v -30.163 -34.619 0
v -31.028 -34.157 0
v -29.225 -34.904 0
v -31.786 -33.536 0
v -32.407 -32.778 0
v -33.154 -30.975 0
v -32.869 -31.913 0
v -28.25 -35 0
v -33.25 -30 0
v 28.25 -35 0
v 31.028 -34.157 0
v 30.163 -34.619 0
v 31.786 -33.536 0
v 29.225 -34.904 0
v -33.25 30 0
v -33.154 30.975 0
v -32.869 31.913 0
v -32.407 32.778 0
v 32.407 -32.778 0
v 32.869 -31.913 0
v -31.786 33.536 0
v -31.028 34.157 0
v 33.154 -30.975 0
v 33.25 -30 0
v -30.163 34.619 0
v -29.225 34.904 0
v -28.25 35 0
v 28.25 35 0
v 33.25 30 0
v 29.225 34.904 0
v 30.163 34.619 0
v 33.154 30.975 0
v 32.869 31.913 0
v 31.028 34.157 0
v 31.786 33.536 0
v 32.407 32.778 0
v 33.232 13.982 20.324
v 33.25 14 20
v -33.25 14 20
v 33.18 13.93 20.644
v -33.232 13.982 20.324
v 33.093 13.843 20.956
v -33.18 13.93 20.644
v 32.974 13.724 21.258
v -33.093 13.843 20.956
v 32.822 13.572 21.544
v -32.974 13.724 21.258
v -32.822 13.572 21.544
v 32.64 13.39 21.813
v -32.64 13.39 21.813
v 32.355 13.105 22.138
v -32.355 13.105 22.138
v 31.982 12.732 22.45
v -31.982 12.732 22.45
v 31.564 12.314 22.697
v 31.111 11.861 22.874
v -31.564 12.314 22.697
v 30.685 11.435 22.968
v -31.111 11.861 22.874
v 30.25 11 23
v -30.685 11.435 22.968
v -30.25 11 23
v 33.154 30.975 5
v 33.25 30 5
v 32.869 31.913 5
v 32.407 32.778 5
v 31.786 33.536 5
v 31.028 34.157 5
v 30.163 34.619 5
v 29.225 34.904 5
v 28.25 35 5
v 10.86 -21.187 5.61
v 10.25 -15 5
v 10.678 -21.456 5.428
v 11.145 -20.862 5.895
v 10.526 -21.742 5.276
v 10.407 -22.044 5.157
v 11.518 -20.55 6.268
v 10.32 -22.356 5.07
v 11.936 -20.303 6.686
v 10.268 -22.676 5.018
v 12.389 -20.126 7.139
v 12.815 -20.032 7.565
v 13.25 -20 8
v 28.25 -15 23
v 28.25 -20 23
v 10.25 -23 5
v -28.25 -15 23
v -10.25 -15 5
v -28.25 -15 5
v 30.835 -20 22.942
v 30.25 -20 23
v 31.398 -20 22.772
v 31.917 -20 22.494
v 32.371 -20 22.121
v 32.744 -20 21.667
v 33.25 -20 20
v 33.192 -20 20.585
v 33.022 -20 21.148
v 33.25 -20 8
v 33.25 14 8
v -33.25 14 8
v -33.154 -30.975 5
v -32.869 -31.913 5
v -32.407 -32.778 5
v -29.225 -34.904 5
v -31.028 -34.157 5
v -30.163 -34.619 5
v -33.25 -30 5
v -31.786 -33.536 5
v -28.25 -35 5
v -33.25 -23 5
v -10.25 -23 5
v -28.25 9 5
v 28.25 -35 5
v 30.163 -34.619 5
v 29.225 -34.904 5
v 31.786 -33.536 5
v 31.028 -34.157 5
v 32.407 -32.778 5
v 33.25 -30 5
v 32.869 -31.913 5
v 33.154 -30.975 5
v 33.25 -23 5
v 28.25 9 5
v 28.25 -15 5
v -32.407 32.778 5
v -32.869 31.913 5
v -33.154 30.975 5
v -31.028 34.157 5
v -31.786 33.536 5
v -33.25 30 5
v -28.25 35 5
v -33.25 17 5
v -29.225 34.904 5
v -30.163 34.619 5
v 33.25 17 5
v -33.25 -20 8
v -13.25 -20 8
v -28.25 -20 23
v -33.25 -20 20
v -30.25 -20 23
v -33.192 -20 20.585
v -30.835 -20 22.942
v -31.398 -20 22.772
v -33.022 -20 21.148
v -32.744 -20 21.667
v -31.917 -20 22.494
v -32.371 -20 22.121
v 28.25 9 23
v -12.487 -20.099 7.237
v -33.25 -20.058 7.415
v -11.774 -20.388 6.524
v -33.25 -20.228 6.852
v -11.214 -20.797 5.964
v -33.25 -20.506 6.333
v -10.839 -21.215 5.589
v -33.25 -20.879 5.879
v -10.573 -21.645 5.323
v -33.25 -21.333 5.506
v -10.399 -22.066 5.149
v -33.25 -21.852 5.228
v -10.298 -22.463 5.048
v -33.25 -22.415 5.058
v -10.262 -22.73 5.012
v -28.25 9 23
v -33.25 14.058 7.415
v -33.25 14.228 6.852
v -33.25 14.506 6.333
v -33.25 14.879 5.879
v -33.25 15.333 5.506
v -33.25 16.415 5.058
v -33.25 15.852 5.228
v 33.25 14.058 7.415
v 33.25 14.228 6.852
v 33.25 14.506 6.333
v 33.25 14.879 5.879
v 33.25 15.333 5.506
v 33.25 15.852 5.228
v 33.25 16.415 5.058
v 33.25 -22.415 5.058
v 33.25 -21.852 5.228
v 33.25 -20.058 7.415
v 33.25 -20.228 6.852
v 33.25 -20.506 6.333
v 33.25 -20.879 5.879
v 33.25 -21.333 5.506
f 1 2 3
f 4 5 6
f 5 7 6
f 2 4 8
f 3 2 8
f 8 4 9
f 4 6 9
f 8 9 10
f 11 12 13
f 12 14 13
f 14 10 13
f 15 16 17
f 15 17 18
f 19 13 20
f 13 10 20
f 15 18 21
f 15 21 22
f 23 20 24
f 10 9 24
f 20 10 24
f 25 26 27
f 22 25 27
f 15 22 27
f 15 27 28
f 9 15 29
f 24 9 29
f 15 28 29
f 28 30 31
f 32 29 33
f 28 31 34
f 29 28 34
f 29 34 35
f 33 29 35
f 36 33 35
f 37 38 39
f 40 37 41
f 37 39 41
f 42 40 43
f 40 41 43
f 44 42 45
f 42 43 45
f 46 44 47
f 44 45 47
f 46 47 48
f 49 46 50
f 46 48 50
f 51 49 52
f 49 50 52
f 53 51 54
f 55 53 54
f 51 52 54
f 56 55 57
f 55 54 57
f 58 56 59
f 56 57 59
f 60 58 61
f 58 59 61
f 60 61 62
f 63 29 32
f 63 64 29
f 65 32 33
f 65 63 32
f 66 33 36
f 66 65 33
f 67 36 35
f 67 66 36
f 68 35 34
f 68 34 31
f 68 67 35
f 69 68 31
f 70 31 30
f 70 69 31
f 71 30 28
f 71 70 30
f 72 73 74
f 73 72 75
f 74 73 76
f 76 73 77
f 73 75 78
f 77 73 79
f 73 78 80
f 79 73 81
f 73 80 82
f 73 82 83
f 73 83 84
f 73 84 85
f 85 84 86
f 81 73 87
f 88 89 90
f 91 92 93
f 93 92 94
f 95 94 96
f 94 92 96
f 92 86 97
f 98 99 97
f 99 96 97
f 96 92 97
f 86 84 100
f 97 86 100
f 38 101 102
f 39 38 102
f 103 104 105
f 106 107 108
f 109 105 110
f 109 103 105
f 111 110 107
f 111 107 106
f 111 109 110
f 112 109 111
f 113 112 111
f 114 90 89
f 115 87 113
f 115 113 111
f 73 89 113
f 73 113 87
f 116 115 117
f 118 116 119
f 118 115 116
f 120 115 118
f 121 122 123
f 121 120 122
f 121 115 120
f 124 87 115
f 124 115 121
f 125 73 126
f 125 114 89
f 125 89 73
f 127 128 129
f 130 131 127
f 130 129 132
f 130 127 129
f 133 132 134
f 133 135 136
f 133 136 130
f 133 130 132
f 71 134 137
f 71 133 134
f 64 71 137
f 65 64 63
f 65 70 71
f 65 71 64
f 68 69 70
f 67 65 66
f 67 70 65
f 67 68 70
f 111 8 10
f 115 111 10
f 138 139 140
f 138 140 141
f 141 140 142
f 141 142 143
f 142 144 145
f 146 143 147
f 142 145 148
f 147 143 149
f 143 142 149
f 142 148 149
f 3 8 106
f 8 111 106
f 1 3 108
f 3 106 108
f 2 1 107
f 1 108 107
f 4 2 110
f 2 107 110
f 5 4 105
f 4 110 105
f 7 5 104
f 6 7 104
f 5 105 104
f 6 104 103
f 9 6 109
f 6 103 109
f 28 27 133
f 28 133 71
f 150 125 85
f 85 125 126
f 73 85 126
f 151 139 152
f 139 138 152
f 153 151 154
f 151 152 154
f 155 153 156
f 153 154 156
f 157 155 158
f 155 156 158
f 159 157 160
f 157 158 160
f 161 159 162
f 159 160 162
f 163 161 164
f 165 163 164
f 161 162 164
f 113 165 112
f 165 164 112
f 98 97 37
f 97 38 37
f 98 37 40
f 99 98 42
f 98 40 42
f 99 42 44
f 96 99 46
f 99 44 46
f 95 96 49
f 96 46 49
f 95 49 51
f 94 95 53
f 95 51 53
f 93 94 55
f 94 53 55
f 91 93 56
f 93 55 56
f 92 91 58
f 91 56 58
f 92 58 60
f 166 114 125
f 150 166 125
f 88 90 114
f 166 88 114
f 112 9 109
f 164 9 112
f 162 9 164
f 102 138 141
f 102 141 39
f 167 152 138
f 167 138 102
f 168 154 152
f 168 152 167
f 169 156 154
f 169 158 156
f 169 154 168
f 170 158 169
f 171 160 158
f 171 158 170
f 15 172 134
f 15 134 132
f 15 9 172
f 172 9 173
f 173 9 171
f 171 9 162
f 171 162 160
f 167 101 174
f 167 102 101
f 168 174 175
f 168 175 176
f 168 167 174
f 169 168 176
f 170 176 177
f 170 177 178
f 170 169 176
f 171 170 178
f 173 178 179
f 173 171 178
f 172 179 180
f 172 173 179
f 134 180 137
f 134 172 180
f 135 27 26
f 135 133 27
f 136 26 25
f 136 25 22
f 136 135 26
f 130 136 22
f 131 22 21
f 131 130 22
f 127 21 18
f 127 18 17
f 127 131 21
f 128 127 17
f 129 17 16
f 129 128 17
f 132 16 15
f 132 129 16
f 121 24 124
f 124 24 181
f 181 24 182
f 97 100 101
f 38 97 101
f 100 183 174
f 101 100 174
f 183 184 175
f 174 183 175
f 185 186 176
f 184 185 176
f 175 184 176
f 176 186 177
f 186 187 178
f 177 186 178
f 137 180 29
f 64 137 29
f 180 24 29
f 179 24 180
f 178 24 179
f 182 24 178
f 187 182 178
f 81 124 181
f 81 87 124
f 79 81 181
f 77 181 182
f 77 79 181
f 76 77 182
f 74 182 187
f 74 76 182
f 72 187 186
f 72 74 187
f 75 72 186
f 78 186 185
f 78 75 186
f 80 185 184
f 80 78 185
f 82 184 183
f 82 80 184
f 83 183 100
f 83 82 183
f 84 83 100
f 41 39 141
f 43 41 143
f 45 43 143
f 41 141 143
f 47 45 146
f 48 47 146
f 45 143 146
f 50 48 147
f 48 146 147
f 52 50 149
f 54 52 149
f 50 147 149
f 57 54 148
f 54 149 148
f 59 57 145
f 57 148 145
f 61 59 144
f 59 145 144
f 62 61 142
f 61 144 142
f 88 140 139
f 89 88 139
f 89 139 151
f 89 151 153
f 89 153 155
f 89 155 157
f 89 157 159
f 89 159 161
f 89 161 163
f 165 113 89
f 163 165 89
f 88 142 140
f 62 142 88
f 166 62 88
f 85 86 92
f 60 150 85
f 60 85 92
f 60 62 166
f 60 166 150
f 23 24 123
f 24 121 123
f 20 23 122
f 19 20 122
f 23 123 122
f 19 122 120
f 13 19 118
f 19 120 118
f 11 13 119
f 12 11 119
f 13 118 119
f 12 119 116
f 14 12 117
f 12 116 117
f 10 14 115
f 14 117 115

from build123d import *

# Parameters (mm, degrees)
SKETCH_W     = 66.5
SKETCH_H     = 70
PAD_DEPTH    = 5
PAD001_DEPTH = 18
PAD002_DEPTH = 5
FILLET_R     = 5
FILLET001_R  = 5
FILLET002_R  = 5
FILLET003_R  = 5
FILLET004_R  = 3
FILLET005_R  = 3
FILLET006_R  = 3


with BuildPart() as part:
    # Sketch → Pad (new body)
    with BuildSketch(Plane.XY):
        Rectangle(SKETCH_W, SKETCH_H)
    extrude(amount=PAD_DEPTH)

    # Sketch001 (on Face6 of Pad) → Pad001 (join)
    with BuildSketch(Plane.XY.offset(5)):
        Polygon((-28.25, -20), (-28.25, 9), (28.25, 9), (28.25, -20), (33.25, -20), (33.25, 14), (-33.25, 14), (-33.25, -20), align=None)
    extrude(amount=PAD001_DEPTH)

    # Sketch002 (on Face11 of Pad001) → Pad002 (join)
    with BuildSketch(Plane.XZ.offset(20)):
        Polygon((-28.25, 23), (-10.25, 5), (-28.25, 5), align=None)
        Polygon((10.25, 5), (28.25, 23), (28.25, 5), align=None)
    extrude(amount=-PAD002_DEPTH)

    # Fillet
    fillet_edges = [part.edges().sort_by_distance(p)[0] for p in [
        (33.25, -35, 2.5),
    ]]
    fillet(fillet_edges, radius=FILLET_R)

    # Fillet001
    fillet001_edges = [part.edges().sort_by_distance(p)[0] for p in [
        (-33.25, -35, 2.5),
    ]]
    fillet(fillet001_edges, radius=FILLET001_R)

    # Fillet002
    fillet002_edges = [part.edges().sort_by_distance(p)[0] for p in [
        (33.25, 35, 2.5),
    ]]
    fillet(fillet002_edges, radius=FILLET002_R)

    # Fillet003
    fillet003_edges = [part.edges().sort_by_distance(p)[0] for p in [
        (-33.25, 35, 2.5),
    ]]
    fillet(fillet003_edges, radius=FILLET003_R)

    # Fillet004
    fillet004_edges = [part.edges().sort_by_distance(p)[0] for p in [
        (33.25, -3, 23),
        (0, 14, 23),
        (-33.25, -3, 23),
    ]]
    fillet(fillet004_edges, radius=FILLET004_R)

    # Fillet005
    fillet005_edges = [part.edges().sort_by_distance(p)[0] for p in [
        (0, 14, 5),
    ]]
    fillet(fillet005_edges, radius=FILLET005_R)

    # Fillet006
    fillet006_edges = [part.edges().sort_by_distance(p)[0] for p in [
        (30.75, -20, 5),
        (-19.25, -20, 5),
        (-30.75, -20, 5),
        (19.25, -20, 5),
    ]]
    fillet(fillet006_edges, radius=FILLET006_R)


solid = part.part
